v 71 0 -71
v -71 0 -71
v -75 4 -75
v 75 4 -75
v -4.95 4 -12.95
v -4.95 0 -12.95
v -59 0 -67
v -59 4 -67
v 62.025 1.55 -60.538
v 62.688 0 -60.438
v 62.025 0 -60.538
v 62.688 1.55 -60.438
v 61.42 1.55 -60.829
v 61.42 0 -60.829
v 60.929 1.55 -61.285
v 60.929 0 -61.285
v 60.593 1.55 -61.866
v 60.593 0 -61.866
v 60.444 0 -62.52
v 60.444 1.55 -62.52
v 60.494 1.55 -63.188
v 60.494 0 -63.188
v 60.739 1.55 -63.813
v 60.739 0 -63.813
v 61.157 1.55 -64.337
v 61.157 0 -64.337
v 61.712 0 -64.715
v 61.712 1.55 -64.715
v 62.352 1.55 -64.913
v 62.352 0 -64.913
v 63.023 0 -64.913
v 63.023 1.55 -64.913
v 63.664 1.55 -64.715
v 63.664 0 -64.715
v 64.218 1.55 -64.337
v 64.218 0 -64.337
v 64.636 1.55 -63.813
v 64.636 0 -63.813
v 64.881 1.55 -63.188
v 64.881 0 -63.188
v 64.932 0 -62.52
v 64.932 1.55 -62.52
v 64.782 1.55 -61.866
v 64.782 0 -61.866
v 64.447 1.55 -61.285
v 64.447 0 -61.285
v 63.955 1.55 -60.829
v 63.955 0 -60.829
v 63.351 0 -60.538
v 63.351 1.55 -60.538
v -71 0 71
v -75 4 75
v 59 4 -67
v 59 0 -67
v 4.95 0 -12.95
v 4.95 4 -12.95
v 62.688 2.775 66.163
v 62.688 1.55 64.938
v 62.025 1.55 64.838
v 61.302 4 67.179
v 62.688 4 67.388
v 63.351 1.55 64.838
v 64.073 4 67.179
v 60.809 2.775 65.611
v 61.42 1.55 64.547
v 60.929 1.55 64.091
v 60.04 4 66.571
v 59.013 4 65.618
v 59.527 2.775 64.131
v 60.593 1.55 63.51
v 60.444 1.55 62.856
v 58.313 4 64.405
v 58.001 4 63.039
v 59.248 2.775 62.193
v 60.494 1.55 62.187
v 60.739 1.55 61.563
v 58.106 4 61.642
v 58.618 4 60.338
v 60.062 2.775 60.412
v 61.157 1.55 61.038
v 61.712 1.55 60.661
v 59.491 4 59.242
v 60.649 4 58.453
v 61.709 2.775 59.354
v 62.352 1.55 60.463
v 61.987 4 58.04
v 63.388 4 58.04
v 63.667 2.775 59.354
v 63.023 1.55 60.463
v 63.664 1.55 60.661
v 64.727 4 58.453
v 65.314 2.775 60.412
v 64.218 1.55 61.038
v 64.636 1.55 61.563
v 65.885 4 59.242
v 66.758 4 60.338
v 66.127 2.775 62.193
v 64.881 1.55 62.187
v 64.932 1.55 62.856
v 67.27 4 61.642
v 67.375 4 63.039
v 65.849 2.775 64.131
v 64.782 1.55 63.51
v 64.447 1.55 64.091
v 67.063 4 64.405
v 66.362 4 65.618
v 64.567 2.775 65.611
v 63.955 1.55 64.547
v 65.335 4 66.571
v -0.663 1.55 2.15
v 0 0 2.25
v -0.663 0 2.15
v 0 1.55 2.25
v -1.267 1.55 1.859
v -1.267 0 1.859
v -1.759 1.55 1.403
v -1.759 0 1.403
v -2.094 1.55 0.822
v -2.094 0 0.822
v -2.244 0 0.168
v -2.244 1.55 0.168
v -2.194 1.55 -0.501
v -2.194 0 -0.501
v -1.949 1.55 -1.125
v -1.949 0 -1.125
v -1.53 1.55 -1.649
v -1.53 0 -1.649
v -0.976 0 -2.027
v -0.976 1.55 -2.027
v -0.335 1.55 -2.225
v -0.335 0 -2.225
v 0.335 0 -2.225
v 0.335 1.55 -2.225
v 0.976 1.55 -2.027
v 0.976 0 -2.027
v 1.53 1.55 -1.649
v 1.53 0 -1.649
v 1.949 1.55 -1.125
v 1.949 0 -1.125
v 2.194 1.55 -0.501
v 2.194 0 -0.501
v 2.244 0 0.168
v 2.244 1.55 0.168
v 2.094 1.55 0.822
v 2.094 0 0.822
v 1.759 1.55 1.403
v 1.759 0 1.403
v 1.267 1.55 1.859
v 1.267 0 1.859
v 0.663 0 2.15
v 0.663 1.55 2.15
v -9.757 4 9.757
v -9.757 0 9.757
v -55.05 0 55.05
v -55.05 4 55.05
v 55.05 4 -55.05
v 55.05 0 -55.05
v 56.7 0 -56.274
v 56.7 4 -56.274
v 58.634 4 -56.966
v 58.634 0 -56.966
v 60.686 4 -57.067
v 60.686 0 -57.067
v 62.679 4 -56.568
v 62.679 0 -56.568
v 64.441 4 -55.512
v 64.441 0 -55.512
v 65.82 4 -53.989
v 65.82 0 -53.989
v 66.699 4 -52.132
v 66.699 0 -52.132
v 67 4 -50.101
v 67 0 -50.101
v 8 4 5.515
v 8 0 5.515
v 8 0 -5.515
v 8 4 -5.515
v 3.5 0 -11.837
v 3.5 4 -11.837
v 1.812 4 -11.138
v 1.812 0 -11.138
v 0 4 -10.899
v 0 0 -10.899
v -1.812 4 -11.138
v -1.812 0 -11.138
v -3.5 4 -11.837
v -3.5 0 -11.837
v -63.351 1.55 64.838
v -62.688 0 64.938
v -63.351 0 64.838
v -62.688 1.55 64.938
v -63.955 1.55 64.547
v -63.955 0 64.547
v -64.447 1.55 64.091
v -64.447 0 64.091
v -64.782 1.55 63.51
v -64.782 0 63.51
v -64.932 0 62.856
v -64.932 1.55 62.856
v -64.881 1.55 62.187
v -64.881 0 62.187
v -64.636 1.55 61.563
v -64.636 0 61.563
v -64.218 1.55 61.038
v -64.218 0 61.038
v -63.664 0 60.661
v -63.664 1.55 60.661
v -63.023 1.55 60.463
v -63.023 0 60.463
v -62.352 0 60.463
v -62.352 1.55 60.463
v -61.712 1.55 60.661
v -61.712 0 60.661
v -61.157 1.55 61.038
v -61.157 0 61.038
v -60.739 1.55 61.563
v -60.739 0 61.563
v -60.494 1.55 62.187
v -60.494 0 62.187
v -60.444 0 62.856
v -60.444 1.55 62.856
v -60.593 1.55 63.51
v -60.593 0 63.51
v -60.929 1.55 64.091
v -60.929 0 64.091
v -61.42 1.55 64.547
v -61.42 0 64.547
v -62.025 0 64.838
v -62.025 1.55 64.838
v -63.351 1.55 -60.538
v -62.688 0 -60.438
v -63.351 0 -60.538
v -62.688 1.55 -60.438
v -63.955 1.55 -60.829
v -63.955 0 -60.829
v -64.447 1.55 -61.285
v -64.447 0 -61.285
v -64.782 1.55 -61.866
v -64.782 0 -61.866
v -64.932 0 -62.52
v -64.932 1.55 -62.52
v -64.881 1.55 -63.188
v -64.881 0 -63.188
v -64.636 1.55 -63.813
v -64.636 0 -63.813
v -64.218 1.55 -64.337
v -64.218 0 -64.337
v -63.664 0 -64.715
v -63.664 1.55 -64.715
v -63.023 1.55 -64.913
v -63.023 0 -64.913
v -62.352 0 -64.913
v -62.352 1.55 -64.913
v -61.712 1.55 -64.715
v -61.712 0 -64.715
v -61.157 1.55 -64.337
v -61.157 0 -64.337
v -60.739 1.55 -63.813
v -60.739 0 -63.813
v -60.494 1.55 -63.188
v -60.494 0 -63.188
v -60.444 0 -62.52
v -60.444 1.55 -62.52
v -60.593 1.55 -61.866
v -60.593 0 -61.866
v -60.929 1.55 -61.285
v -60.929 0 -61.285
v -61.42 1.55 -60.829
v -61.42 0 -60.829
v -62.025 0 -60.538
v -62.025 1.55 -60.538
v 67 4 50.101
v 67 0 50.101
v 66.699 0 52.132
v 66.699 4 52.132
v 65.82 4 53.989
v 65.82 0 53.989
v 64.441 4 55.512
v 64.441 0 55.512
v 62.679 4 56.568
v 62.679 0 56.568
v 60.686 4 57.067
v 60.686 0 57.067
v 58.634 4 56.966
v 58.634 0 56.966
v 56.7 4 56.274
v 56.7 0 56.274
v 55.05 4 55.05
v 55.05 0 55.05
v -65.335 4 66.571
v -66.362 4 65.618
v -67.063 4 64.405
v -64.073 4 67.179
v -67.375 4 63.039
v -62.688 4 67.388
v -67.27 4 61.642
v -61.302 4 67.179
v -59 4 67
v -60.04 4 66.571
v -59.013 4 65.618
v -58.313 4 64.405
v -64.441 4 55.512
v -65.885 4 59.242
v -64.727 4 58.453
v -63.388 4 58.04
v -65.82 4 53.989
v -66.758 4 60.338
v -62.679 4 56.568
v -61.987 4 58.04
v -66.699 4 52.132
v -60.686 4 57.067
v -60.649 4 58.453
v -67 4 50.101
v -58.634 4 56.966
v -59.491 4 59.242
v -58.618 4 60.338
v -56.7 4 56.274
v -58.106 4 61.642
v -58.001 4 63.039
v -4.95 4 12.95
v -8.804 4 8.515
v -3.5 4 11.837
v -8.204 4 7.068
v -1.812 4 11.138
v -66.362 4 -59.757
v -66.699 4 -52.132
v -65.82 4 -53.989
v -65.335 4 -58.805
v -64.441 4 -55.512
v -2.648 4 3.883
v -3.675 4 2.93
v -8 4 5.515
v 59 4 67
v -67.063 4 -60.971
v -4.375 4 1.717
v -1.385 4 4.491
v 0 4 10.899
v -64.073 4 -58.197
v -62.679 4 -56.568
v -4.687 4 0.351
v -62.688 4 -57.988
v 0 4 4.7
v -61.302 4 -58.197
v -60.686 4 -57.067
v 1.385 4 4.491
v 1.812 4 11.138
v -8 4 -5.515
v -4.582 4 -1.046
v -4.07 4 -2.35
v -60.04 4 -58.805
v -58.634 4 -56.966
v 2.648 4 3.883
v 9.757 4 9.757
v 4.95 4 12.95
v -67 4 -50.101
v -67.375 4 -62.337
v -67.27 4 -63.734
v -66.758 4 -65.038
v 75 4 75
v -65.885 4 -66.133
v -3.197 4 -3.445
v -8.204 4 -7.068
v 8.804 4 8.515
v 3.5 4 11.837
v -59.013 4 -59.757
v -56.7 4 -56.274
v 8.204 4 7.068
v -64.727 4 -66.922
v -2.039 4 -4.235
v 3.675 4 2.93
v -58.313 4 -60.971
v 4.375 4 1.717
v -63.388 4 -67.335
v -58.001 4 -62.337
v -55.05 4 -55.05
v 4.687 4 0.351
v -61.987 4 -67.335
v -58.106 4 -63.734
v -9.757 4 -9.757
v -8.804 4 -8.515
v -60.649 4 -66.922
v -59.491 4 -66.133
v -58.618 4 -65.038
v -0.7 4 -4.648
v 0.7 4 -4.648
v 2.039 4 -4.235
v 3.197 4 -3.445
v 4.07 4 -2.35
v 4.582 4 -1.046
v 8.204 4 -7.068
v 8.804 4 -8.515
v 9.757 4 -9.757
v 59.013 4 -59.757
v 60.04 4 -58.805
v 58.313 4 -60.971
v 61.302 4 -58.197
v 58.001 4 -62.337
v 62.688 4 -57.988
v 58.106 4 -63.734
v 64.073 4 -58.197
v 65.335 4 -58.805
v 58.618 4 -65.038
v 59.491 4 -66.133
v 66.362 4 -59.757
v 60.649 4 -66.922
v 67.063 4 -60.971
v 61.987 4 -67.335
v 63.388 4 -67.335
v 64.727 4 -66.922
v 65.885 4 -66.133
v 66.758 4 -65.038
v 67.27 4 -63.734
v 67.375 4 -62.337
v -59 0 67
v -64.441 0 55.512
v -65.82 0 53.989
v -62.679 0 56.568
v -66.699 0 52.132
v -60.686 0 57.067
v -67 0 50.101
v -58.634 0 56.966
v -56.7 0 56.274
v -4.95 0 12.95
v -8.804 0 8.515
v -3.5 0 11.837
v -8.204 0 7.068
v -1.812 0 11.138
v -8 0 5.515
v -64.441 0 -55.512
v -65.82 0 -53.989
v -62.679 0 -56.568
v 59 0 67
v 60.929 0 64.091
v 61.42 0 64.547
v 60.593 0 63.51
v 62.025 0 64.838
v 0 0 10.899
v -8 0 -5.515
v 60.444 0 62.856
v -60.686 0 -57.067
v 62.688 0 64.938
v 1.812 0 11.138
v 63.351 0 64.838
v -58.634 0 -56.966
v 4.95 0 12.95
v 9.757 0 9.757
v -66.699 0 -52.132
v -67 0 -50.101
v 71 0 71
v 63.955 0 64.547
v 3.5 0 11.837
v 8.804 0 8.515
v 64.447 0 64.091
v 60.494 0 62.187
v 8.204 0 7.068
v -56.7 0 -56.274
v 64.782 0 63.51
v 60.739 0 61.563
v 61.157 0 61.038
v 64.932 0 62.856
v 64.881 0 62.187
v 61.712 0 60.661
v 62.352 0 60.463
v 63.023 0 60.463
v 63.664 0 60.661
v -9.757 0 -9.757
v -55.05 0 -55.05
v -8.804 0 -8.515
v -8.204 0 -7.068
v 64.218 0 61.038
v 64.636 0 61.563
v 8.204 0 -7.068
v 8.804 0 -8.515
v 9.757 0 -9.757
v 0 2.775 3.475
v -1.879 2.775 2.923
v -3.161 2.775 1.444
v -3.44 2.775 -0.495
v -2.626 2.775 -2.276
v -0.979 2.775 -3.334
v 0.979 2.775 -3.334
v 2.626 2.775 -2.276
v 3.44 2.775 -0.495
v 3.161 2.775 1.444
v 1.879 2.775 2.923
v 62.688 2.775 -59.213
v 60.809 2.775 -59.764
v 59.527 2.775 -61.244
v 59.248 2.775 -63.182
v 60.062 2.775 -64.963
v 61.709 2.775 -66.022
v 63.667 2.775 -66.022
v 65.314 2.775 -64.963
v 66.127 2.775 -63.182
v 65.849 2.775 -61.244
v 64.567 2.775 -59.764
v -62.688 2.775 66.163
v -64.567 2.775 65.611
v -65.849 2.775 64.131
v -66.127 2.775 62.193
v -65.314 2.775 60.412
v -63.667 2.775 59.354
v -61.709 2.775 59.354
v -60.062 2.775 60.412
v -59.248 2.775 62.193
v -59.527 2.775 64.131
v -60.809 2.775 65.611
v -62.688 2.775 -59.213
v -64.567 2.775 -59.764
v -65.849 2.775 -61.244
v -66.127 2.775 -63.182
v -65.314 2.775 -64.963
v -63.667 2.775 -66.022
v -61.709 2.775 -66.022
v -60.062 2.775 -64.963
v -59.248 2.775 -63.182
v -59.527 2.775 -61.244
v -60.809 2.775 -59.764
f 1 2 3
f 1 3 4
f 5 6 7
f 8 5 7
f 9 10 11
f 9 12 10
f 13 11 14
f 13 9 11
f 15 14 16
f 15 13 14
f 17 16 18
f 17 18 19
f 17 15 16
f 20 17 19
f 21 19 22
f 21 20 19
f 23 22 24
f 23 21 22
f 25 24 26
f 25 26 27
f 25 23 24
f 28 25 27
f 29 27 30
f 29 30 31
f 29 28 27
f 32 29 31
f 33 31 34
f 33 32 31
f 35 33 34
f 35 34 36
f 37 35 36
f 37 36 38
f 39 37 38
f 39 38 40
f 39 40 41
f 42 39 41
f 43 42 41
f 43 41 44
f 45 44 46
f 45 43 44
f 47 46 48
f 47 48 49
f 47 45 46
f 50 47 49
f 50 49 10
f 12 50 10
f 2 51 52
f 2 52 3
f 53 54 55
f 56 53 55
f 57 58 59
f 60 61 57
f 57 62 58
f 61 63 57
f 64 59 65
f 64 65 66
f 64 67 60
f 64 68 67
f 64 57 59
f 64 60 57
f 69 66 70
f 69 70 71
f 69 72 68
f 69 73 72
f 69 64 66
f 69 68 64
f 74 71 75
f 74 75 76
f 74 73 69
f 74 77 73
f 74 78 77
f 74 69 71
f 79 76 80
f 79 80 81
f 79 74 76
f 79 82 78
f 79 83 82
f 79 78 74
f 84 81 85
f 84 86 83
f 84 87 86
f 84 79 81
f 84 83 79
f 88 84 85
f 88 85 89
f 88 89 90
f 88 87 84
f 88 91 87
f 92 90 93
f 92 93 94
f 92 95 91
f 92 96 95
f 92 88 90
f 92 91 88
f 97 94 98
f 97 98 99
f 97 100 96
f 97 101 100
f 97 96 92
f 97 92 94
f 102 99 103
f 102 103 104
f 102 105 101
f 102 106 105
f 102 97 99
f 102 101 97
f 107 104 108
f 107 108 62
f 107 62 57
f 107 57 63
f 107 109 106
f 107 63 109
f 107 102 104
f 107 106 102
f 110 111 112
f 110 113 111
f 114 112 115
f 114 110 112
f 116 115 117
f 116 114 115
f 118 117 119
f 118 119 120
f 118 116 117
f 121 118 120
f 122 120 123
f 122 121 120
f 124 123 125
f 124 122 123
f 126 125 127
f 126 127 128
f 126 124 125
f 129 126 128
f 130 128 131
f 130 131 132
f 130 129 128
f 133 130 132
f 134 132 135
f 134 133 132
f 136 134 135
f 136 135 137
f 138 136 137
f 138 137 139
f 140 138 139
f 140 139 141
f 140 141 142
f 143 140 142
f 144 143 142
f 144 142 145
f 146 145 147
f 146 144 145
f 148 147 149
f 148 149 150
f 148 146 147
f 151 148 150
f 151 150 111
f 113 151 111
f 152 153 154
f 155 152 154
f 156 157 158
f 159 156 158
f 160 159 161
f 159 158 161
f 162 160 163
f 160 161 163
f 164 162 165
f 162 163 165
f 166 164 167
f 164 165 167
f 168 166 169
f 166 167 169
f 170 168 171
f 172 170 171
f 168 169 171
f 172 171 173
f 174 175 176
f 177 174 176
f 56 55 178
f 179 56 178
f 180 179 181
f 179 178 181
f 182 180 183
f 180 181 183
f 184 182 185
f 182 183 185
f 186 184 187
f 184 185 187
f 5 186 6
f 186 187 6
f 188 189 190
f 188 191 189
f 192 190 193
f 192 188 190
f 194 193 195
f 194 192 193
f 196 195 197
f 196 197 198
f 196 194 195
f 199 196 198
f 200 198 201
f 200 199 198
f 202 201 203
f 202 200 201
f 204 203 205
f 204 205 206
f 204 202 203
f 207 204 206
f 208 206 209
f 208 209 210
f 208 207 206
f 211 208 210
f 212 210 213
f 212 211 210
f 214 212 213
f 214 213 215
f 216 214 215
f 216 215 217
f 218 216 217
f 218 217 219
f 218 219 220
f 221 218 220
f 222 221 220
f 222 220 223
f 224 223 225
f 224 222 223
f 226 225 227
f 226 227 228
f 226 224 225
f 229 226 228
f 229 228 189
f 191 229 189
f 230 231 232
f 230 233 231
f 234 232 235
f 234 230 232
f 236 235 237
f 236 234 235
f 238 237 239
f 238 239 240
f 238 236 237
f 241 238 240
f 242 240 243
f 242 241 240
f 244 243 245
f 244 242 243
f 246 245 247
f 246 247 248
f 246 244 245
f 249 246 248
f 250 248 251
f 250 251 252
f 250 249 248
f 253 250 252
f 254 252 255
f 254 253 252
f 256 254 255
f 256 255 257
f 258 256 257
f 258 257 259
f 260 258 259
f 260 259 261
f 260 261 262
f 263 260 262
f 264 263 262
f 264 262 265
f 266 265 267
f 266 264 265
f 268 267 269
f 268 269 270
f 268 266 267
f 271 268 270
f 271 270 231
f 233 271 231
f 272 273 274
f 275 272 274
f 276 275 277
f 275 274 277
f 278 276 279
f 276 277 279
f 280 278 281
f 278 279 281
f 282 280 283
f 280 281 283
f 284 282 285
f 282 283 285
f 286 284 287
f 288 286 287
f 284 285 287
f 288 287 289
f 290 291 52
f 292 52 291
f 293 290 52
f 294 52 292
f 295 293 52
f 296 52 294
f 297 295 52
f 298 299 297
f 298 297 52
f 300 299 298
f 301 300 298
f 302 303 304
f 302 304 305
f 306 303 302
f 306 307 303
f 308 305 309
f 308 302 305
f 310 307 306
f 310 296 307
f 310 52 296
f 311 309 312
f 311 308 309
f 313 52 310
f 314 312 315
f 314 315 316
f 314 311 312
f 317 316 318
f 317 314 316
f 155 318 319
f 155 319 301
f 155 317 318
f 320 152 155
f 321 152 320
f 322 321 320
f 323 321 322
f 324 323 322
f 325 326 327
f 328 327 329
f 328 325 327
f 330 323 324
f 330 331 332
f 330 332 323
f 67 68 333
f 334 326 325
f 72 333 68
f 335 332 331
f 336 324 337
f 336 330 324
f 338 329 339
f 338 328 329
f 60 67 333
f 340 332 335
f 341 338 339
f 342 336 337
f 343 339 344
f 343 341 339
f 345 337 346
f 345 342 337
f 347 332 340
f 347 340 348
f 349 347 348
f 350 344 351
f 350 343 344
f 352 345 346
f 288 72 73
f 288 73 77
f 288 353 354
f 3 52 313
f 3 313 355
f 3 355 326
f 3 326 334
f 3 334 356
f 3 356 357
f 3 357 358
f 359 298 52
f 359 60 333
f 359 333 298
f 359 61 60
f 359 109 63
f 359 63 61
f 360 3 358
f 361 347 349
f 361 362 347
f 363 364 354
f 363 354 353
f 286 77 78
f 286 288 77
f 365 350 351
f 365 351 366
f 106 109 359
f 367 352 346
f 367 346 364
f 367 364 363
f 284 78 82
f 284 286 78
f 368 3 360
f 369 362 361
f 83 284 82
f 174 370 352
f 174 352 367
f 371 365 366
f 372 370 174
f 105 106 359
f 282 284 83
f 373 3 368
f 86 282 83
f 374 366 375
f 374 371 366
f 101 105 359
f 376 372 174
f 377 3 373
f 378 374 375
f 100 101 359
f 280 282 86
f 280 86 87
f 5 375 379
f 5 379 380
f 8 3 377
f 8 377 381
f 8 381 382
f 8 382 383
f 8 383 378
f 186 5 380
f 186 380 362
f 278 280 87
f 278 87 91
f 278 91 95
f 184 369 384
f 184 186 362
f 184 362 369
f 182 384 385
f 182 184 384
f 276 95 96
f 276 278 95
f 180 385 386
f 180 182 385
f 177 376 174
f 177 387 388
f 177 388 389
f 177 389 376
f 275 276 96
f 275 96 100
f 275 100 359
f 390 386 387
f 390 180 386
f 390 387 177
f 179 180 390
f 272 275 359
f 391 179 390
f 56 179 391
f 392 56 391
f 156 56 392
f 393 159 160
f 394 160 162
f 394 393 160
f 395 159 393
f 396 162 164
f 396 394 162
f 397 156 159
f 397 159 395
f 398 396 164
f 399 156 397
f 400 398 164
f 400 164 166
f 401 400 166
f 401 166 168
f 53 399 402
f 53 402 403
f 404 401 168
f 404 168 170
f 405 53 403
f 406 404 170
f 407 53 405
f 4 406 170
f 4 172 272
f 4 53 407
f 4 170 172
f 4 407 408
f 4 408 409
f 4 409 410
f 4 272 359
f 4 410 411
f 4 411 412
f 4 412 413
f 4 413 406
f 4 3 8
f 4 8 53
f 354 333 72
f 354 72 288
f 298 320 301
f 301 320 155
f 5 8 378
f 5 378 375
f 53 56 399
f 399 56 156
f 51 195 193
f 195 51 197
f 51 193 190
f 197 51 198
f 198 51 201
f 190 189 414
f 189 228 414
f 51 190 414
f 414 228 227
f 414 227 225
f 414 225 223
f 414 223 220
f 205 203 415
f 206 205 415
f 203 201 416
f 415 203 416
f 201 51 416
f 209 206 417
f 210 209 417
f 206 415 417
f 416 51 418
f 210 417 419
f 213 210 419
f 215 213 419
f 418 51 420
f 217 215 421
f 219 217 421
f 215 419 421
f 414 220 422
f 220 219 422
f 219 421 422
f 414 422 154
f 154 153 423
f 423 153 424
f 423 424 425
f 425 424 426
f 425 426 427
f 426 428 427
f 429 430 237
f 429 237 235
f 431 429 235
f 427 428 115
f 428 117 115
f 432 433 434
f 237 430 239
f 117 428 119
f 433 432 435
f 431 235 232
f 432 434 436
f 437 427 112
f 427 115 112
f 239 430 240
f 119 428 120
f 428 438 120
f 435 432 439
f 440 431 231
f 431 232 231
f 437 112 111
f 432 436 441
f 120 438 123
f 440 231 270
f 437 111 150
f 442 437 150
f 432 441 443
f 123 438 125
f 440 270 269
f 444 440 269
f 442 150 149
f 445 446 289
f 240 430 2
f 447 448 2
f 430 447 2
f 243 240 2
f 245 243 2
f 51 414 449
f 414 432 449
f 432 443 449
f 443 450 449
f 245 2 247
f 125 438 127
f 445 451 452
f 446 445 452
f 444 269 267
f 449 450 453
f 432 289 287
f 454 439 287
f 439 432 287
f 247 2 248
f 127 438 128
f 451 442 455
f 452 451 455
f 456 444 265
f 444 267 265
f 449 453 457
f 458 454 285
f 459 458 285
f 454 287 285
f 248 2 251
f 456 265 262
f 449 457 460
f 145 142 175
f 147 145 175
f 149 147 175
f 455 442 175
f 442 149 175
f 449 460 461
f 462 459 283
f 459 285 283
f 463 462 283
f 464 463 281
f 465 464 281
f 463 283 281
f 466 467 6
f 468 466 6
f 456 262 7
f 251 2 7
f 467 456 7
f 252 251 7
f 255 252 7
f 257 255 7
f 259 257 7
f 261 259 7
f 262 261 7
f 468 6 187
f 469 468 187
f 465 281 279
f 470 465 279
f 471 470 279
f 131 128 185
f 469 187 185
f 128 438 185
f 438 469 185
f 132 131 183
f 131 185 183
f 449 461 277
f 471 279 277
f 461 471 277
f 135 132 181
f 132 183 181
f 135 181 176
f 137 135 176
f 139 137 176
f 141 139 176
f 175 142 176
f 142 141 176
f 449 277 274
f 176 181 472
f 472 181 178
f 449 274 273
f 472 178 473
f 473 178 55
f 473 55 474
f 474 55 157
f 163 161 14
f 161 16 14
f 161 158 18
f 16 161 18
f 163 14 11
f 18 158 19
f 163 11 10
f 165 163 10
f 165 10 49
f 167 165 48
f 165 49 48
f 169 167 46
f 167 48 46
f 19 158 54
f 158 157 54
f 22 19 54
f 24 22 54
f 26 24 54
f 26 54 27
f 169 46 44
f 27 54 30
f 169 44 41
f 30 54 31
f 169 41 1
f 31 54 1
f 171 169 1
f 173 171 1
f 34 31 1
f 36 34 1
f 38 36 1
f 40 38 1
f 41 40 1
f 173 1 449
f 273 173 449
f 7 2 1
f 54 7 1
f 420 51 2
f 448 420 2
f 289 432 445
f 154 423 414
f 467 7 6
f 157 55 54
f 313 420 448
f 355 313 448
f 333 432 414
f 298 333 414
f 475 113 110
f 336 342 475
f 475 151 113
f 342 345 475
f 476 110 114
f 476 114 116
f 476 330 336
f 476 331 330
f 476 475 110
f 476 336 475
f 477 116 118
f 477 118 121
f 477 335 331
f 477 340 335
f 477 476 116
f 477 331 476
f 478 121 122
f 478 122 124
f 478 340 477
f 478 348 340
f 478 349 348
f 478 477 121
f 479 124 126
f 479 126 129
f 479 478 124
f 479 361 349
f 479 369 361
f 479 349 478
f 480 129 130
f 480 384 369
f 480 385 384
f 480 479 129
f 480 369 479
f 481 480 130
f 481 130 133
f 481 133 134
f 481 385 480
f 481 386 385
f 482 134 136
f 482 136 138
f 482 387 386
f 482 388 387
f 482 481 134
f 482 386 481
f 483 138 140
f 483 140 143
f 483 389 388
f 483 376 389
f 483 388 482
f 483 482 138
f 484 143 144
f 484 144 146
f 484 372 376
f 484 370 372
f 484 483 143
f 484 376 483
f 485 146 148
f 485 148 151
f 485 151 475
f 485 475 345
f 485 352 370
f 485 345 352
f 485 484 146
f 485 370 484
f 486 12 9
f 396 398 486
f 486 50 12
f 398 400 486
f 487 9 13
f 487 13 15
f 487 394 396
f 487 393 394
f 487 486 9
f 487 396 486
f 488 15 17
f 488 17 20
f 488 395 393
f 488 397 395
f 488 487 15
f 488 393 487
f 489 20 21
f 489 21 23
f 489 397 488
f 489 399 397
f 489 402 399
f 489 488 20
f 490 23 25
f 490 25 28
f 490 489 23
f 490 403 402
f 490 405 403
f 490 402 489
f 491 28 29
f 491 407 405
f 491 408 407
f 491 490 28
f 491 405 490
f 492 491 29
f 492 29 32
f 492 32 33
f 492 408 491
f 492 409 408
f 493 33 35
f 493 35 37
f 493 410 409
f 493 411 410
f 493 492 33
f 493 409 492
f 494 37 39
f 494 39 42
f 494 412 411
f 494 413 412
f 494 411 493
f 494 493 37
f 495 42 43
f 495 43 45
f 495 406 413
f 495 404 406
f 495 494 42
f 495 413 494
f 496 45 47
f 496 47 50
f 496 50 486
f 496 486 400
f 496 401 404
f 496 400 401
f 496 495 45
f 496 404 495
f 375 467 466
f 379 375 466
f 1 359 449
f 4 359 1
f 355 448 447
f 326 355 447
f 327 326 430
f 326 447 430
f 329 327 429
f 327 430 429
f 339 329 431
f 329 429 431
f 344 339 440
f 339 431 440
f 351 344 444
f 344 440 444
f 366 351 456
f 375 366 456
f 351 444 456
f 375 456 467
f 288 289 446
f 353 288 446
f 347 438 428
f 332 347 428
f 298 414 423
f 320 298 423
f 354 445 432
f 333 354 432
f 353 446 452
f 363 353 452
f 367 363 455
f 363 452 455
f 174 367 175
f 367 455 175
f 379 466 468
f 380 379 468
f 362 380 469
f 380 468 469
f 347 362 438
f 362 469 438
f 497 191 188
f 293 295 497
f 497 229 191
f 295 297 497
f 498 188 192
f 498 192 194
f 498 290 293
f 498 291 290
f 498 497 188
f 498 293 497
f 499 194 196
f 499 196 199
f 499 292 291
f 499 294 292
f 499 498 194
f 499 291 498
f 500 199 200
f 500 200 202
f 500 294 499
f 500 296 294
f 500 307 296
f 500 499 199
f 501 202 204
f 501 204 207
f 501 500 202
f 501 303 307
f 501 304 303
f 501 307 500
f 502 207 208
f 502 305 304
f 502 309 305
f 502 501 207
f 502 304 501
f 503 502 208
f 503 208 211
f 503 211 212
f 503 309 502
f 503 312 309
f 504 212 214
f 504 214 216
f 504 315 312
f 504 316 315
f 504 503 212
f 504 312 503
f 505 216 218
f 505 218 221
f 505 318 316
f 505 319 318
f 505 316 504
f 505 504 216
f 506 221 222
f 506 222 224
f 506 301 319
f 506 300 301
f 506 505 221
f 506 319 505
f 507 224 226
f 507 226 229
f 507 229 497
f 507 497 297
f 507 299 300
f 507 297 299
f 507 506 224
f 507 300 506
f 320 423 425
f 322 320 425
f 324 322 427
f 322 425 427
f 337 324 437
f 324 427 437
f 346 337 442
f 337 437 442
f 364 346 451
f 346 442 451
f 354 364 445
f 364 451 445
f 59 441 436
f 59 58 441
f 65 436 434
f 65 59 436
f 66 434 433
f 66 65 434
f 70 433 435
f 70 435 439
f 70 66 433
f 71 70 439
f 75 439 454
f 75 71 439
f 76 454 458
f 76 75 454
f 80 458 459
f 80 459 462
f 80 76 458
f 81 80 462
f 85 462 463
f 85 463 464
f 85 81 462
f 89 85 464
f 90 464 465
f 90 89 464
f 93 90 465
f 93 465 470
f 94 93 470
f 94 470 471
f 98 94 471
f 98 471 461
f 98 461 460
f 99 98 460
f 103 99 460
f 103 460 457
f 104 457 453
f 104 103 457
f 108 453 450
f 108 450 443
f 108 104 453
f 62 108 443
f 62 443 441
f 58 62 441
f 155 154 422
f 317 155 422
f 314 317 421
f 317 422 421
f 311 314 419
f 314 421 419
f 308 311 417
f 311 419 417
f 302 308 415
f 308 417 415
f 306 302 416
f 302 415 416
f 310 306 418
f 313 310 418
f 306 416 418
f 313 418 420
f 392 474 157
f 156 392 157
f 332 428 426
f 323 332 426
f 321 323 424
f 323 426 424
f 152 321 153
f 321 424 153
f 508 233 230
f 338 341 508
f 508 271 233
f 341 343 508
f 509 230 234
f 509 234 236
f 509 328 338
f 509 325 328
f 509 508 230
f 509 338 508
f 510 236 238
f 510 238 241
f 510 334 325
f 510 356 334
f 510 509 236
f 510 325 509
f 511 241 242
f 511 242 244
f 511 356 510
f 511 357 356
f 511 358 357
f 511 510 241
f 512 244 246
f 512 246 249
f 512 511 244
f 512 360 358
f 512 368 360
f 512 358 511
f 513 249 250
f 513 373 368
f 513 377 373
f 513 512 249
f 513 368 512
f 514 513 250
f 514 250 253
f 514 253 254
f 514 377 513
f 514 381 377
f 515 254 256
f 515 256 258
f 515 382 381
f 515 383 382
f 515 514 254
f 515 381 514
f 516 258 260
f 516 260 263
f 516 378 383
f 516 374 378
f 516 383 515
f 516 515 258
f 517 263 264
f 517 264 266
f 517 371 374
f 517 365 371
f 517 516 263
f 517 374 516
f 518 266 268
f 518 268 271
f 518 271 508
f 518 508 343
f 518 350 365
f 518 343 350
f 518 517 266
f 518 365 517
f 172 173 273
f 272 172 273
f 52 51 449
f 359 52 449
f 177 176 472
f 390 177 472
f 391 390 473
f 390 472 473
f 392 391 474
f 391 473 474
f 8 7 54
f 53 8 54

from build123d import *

# Parameters (mm, degrees)
SKETCH1_W                                      = 150
SKETCH1_H                                      = 150
BOSS_EXTRUDE2_DEPTH                            = 4
CSK_FOR_M4_FLAT_HEAD_MACHINE_SCREW1_AT_2_COUNT = 2
CSK_FOR_M4_FLAT_HEAD_MACHINE_SCREW1_AT_2_PITCH = 88.653975713
CSK_FOR_M4_FLAT_HEAD_MACHINE_SCREW1_AT_3_COUNT = 2
CSK_FOR_M4_FLAT_HEAD_MACHINE_SCREW1_AT_3_PITCH = 88.653975713
CSK_FOR_M4_FLAT_HEAD_MACHINE_SCREW1_AT_4_COUNT = 2
CSK_FOR_M4_FLAT_HEAD_MACHINE_SCREW1_AT_4_PITCH = 88.653975713
CSK_FOR_M4_FLAT_HEAD_MACHINE_SCREW1_AT_5_COUNT = 2
CSK_FOR_M4_FLAT_HEAD_MACHINE_SCREW1_AT_5_PITCH = 88.653975713
CHAMFER2_SIZE                                  = 4


with BuildPart() as part:
    # Sketch1 → Boss-Extrude2 (new body)
    with BuildSketch(Plane(origin=(0, 0, 0), x_dir=(1, 0, 0), z_dir=(0, 1, 0))):
        Rectangle(SKETCH1_W, SKETCH1_H)
        with BuildLine():
            Line((-59, 67), (59, 67))
            Line((59, 67), (4.949747468, 12.949747468))
            ThreePointArc((4.949747468, 12.949747468), (0, 10.899494937), (-4.949747468, 12.949747468))
            Line((-4.949747468, 12.949747468), (-59, 67))
        make_face(mode=Mode.SUBTRACT)
        with BuildLine():
            Line((59, -67), (-59, -67))
            Line((-59, -67), (-4.949747468, -12.949747468))
            ThreePointArc((-4.949747468, -12.949747468), (0, -10.899494937), (4.949747468, -12.949747468))
            Line((4.949747468, -12.949747468), (59, -67))
        make_face(mode=Mode.SUBTRACT)
        with BuildLine():
            Line((-67, -50.100505063), (-67, 50.100505063))
            ThreePointArc((-67, 50.100505063), (-62.678784027, 56.567661791), (-55.050252532, 55.050252532))
            Line((-55.050252532, 55.050252532), (-9.757359313, 9.757359313))
            ThreePointArc((-9.757359313, 9.757359313), (-8.456722805, 7.81081922), (-8, 5.514718626))
            Line((-8, 5.514718626), (-8, -5.514718626))
            ThreePointArc((-8, -5.514718626), (-8.456722805, -7.81081922), (-9.757359313, -9.757359313))
            Line((-9.757359313, -9.757359313), (-55.050252532, -55.050252532))
            ThreePointArc((-55.050252532, -55.050252532), (-62.678784027, -56.567661791), (-67, -50.100505063))
        make_face(mode=Mode.SUBTRACT)
        with BuildLine():
            ThreePointArc((67, -50.100505063), (62.678784027, -56.567661791), (55.050252532, -55.050252532))
            Line((55.050252532, -55.050252532), (9.757359313, -9.757359313))
            ThreePointArc((9.757359313, -9.757359313), (8.456722805, -7.81081922), (8, -5.514718626))
            Line((8, -5.514718626), (8, 5.514718626))
            ThreePointArc((8, 5.514718626), (8.456722805, 7.81081922), (9.757359313, 9.757359313))
            Line((9.757359313, 9.757359313), (55.050252532, 55.050252532))
            ThreePointArc((55.050252532, 55.050252532), (62.678784027, 56.567661791), (67, 50.100505063))
            Line((67, 50.100505063), (67, -50.100505063))
        make_face(mode=Mode.SUBTRACT)
    extrude(amount=BOSS_EXTRUDE2_DEPTH)

    # Sketch5 → CSK for M4 Flat Head Machine Screw1 (revolve, cut)
    with BuildSketch(Plane(origin=(0, 4, 0), x_dir=(0, 0, 1), z_dir=(1, 0, 0))):
        Polygon((0, 0), (0, 4), (2.25, 4), (2.25, 2.45), (4.7, 0), align=None)
    csk_for_m4_flat_head_machine_screw1 = revolve(axis=Axis((0, 10.35, 0), (0, -1, 0)), mode=Mode.SUBTRACT)

    # CSK for M4 Flat Head Machine Screw1 at 2: CSK for M4 Flat Head Machine Screw1 ×2
    with Locations(*[Vector(-0.7071067811865477, 0, -0.7071067811865474) * (i * CSK_FOR_M4_FLAT_HEAD_MACHINE_SCREW1_AT_2_PITCH) for i in range(1, CSK_FOR_M4_FLAT_HEAD_MACHINE_SCREW1_AT_2_COUNT)]):
        add(csk_for_m4_flat_head_machine_screw1, mode=Mode.SUBTRACT)

    # CSK for M4 Flat Head Machine Screw1 at 3: CSK for M4 Flat Head Machine Screw1 ×2
    with Locations(*[Vector(0.7071067811865477, 0, -0.7071067811865474) * (i * CSK_FOR_M4_FLAT_HEAD_MACHINE_SCREW1_AT_3_PITCH) for i in range(1, CSK_FOR_M4_FLAT_HEAD_MACHINE_SCREW1_AT_3_COUNT)]):
        add(csk_for_m4_flat_head_machine_screw1, mode=Mode.SUBTRACT)

    # CSK for M4 Flat Head Machine Screw1 at 4: CSK for M4 Flat Head Machine Screw1 ×2
    with Locations(*[Vector(0.7071067811865477, 0, 0.7071067811865474) * (i * CSK_FOR_M4_FLAT_HEAD_MACHINE_SCREW1_AT_4_PITCH) for i in range(1, CSK_FOR_M4_FLAT_HEAD_MACHINE_SCREW1_AT_4_COUNT)]):
        add(csk_for_m4_flat_head_machine_screw1, mode=Mode.SUBTRACT)

    # CSK for M4 Flat Head Machine Screw1 at 5: CSK for M4 Flat Head Machine Screw1 ×2
    with Locations(*[Vector(-0.7071067811865477, 0, 0.7071067811865474) * (i * CSK_FOR_M4_FLAT_HEAD_MACHINE_SCREW1_AT_5_PITCH) for i in range(1, CSK_FOR_M4_FLAT_HEAD_MACHINE_SCREW1_AT_5_COUNT)]):
        add(csk_for_m4_flat_head_machine_screw1, mode=Mode.SUBTRACT)

    # Chamfer2
    chamfer2_edges = [part.edges().sort_by_distance(p)[0] for p in [
        (0, 0, 75),
        (-75, 0, 0),
        (0, 0, -75),
        (75, 0, 0),
    ]]
    chamfer(chamfer2_edges, length=CHAMFER2_SIZE - 0.0001)  # a hair under: the kernel refuses the full size


solid = part.part
